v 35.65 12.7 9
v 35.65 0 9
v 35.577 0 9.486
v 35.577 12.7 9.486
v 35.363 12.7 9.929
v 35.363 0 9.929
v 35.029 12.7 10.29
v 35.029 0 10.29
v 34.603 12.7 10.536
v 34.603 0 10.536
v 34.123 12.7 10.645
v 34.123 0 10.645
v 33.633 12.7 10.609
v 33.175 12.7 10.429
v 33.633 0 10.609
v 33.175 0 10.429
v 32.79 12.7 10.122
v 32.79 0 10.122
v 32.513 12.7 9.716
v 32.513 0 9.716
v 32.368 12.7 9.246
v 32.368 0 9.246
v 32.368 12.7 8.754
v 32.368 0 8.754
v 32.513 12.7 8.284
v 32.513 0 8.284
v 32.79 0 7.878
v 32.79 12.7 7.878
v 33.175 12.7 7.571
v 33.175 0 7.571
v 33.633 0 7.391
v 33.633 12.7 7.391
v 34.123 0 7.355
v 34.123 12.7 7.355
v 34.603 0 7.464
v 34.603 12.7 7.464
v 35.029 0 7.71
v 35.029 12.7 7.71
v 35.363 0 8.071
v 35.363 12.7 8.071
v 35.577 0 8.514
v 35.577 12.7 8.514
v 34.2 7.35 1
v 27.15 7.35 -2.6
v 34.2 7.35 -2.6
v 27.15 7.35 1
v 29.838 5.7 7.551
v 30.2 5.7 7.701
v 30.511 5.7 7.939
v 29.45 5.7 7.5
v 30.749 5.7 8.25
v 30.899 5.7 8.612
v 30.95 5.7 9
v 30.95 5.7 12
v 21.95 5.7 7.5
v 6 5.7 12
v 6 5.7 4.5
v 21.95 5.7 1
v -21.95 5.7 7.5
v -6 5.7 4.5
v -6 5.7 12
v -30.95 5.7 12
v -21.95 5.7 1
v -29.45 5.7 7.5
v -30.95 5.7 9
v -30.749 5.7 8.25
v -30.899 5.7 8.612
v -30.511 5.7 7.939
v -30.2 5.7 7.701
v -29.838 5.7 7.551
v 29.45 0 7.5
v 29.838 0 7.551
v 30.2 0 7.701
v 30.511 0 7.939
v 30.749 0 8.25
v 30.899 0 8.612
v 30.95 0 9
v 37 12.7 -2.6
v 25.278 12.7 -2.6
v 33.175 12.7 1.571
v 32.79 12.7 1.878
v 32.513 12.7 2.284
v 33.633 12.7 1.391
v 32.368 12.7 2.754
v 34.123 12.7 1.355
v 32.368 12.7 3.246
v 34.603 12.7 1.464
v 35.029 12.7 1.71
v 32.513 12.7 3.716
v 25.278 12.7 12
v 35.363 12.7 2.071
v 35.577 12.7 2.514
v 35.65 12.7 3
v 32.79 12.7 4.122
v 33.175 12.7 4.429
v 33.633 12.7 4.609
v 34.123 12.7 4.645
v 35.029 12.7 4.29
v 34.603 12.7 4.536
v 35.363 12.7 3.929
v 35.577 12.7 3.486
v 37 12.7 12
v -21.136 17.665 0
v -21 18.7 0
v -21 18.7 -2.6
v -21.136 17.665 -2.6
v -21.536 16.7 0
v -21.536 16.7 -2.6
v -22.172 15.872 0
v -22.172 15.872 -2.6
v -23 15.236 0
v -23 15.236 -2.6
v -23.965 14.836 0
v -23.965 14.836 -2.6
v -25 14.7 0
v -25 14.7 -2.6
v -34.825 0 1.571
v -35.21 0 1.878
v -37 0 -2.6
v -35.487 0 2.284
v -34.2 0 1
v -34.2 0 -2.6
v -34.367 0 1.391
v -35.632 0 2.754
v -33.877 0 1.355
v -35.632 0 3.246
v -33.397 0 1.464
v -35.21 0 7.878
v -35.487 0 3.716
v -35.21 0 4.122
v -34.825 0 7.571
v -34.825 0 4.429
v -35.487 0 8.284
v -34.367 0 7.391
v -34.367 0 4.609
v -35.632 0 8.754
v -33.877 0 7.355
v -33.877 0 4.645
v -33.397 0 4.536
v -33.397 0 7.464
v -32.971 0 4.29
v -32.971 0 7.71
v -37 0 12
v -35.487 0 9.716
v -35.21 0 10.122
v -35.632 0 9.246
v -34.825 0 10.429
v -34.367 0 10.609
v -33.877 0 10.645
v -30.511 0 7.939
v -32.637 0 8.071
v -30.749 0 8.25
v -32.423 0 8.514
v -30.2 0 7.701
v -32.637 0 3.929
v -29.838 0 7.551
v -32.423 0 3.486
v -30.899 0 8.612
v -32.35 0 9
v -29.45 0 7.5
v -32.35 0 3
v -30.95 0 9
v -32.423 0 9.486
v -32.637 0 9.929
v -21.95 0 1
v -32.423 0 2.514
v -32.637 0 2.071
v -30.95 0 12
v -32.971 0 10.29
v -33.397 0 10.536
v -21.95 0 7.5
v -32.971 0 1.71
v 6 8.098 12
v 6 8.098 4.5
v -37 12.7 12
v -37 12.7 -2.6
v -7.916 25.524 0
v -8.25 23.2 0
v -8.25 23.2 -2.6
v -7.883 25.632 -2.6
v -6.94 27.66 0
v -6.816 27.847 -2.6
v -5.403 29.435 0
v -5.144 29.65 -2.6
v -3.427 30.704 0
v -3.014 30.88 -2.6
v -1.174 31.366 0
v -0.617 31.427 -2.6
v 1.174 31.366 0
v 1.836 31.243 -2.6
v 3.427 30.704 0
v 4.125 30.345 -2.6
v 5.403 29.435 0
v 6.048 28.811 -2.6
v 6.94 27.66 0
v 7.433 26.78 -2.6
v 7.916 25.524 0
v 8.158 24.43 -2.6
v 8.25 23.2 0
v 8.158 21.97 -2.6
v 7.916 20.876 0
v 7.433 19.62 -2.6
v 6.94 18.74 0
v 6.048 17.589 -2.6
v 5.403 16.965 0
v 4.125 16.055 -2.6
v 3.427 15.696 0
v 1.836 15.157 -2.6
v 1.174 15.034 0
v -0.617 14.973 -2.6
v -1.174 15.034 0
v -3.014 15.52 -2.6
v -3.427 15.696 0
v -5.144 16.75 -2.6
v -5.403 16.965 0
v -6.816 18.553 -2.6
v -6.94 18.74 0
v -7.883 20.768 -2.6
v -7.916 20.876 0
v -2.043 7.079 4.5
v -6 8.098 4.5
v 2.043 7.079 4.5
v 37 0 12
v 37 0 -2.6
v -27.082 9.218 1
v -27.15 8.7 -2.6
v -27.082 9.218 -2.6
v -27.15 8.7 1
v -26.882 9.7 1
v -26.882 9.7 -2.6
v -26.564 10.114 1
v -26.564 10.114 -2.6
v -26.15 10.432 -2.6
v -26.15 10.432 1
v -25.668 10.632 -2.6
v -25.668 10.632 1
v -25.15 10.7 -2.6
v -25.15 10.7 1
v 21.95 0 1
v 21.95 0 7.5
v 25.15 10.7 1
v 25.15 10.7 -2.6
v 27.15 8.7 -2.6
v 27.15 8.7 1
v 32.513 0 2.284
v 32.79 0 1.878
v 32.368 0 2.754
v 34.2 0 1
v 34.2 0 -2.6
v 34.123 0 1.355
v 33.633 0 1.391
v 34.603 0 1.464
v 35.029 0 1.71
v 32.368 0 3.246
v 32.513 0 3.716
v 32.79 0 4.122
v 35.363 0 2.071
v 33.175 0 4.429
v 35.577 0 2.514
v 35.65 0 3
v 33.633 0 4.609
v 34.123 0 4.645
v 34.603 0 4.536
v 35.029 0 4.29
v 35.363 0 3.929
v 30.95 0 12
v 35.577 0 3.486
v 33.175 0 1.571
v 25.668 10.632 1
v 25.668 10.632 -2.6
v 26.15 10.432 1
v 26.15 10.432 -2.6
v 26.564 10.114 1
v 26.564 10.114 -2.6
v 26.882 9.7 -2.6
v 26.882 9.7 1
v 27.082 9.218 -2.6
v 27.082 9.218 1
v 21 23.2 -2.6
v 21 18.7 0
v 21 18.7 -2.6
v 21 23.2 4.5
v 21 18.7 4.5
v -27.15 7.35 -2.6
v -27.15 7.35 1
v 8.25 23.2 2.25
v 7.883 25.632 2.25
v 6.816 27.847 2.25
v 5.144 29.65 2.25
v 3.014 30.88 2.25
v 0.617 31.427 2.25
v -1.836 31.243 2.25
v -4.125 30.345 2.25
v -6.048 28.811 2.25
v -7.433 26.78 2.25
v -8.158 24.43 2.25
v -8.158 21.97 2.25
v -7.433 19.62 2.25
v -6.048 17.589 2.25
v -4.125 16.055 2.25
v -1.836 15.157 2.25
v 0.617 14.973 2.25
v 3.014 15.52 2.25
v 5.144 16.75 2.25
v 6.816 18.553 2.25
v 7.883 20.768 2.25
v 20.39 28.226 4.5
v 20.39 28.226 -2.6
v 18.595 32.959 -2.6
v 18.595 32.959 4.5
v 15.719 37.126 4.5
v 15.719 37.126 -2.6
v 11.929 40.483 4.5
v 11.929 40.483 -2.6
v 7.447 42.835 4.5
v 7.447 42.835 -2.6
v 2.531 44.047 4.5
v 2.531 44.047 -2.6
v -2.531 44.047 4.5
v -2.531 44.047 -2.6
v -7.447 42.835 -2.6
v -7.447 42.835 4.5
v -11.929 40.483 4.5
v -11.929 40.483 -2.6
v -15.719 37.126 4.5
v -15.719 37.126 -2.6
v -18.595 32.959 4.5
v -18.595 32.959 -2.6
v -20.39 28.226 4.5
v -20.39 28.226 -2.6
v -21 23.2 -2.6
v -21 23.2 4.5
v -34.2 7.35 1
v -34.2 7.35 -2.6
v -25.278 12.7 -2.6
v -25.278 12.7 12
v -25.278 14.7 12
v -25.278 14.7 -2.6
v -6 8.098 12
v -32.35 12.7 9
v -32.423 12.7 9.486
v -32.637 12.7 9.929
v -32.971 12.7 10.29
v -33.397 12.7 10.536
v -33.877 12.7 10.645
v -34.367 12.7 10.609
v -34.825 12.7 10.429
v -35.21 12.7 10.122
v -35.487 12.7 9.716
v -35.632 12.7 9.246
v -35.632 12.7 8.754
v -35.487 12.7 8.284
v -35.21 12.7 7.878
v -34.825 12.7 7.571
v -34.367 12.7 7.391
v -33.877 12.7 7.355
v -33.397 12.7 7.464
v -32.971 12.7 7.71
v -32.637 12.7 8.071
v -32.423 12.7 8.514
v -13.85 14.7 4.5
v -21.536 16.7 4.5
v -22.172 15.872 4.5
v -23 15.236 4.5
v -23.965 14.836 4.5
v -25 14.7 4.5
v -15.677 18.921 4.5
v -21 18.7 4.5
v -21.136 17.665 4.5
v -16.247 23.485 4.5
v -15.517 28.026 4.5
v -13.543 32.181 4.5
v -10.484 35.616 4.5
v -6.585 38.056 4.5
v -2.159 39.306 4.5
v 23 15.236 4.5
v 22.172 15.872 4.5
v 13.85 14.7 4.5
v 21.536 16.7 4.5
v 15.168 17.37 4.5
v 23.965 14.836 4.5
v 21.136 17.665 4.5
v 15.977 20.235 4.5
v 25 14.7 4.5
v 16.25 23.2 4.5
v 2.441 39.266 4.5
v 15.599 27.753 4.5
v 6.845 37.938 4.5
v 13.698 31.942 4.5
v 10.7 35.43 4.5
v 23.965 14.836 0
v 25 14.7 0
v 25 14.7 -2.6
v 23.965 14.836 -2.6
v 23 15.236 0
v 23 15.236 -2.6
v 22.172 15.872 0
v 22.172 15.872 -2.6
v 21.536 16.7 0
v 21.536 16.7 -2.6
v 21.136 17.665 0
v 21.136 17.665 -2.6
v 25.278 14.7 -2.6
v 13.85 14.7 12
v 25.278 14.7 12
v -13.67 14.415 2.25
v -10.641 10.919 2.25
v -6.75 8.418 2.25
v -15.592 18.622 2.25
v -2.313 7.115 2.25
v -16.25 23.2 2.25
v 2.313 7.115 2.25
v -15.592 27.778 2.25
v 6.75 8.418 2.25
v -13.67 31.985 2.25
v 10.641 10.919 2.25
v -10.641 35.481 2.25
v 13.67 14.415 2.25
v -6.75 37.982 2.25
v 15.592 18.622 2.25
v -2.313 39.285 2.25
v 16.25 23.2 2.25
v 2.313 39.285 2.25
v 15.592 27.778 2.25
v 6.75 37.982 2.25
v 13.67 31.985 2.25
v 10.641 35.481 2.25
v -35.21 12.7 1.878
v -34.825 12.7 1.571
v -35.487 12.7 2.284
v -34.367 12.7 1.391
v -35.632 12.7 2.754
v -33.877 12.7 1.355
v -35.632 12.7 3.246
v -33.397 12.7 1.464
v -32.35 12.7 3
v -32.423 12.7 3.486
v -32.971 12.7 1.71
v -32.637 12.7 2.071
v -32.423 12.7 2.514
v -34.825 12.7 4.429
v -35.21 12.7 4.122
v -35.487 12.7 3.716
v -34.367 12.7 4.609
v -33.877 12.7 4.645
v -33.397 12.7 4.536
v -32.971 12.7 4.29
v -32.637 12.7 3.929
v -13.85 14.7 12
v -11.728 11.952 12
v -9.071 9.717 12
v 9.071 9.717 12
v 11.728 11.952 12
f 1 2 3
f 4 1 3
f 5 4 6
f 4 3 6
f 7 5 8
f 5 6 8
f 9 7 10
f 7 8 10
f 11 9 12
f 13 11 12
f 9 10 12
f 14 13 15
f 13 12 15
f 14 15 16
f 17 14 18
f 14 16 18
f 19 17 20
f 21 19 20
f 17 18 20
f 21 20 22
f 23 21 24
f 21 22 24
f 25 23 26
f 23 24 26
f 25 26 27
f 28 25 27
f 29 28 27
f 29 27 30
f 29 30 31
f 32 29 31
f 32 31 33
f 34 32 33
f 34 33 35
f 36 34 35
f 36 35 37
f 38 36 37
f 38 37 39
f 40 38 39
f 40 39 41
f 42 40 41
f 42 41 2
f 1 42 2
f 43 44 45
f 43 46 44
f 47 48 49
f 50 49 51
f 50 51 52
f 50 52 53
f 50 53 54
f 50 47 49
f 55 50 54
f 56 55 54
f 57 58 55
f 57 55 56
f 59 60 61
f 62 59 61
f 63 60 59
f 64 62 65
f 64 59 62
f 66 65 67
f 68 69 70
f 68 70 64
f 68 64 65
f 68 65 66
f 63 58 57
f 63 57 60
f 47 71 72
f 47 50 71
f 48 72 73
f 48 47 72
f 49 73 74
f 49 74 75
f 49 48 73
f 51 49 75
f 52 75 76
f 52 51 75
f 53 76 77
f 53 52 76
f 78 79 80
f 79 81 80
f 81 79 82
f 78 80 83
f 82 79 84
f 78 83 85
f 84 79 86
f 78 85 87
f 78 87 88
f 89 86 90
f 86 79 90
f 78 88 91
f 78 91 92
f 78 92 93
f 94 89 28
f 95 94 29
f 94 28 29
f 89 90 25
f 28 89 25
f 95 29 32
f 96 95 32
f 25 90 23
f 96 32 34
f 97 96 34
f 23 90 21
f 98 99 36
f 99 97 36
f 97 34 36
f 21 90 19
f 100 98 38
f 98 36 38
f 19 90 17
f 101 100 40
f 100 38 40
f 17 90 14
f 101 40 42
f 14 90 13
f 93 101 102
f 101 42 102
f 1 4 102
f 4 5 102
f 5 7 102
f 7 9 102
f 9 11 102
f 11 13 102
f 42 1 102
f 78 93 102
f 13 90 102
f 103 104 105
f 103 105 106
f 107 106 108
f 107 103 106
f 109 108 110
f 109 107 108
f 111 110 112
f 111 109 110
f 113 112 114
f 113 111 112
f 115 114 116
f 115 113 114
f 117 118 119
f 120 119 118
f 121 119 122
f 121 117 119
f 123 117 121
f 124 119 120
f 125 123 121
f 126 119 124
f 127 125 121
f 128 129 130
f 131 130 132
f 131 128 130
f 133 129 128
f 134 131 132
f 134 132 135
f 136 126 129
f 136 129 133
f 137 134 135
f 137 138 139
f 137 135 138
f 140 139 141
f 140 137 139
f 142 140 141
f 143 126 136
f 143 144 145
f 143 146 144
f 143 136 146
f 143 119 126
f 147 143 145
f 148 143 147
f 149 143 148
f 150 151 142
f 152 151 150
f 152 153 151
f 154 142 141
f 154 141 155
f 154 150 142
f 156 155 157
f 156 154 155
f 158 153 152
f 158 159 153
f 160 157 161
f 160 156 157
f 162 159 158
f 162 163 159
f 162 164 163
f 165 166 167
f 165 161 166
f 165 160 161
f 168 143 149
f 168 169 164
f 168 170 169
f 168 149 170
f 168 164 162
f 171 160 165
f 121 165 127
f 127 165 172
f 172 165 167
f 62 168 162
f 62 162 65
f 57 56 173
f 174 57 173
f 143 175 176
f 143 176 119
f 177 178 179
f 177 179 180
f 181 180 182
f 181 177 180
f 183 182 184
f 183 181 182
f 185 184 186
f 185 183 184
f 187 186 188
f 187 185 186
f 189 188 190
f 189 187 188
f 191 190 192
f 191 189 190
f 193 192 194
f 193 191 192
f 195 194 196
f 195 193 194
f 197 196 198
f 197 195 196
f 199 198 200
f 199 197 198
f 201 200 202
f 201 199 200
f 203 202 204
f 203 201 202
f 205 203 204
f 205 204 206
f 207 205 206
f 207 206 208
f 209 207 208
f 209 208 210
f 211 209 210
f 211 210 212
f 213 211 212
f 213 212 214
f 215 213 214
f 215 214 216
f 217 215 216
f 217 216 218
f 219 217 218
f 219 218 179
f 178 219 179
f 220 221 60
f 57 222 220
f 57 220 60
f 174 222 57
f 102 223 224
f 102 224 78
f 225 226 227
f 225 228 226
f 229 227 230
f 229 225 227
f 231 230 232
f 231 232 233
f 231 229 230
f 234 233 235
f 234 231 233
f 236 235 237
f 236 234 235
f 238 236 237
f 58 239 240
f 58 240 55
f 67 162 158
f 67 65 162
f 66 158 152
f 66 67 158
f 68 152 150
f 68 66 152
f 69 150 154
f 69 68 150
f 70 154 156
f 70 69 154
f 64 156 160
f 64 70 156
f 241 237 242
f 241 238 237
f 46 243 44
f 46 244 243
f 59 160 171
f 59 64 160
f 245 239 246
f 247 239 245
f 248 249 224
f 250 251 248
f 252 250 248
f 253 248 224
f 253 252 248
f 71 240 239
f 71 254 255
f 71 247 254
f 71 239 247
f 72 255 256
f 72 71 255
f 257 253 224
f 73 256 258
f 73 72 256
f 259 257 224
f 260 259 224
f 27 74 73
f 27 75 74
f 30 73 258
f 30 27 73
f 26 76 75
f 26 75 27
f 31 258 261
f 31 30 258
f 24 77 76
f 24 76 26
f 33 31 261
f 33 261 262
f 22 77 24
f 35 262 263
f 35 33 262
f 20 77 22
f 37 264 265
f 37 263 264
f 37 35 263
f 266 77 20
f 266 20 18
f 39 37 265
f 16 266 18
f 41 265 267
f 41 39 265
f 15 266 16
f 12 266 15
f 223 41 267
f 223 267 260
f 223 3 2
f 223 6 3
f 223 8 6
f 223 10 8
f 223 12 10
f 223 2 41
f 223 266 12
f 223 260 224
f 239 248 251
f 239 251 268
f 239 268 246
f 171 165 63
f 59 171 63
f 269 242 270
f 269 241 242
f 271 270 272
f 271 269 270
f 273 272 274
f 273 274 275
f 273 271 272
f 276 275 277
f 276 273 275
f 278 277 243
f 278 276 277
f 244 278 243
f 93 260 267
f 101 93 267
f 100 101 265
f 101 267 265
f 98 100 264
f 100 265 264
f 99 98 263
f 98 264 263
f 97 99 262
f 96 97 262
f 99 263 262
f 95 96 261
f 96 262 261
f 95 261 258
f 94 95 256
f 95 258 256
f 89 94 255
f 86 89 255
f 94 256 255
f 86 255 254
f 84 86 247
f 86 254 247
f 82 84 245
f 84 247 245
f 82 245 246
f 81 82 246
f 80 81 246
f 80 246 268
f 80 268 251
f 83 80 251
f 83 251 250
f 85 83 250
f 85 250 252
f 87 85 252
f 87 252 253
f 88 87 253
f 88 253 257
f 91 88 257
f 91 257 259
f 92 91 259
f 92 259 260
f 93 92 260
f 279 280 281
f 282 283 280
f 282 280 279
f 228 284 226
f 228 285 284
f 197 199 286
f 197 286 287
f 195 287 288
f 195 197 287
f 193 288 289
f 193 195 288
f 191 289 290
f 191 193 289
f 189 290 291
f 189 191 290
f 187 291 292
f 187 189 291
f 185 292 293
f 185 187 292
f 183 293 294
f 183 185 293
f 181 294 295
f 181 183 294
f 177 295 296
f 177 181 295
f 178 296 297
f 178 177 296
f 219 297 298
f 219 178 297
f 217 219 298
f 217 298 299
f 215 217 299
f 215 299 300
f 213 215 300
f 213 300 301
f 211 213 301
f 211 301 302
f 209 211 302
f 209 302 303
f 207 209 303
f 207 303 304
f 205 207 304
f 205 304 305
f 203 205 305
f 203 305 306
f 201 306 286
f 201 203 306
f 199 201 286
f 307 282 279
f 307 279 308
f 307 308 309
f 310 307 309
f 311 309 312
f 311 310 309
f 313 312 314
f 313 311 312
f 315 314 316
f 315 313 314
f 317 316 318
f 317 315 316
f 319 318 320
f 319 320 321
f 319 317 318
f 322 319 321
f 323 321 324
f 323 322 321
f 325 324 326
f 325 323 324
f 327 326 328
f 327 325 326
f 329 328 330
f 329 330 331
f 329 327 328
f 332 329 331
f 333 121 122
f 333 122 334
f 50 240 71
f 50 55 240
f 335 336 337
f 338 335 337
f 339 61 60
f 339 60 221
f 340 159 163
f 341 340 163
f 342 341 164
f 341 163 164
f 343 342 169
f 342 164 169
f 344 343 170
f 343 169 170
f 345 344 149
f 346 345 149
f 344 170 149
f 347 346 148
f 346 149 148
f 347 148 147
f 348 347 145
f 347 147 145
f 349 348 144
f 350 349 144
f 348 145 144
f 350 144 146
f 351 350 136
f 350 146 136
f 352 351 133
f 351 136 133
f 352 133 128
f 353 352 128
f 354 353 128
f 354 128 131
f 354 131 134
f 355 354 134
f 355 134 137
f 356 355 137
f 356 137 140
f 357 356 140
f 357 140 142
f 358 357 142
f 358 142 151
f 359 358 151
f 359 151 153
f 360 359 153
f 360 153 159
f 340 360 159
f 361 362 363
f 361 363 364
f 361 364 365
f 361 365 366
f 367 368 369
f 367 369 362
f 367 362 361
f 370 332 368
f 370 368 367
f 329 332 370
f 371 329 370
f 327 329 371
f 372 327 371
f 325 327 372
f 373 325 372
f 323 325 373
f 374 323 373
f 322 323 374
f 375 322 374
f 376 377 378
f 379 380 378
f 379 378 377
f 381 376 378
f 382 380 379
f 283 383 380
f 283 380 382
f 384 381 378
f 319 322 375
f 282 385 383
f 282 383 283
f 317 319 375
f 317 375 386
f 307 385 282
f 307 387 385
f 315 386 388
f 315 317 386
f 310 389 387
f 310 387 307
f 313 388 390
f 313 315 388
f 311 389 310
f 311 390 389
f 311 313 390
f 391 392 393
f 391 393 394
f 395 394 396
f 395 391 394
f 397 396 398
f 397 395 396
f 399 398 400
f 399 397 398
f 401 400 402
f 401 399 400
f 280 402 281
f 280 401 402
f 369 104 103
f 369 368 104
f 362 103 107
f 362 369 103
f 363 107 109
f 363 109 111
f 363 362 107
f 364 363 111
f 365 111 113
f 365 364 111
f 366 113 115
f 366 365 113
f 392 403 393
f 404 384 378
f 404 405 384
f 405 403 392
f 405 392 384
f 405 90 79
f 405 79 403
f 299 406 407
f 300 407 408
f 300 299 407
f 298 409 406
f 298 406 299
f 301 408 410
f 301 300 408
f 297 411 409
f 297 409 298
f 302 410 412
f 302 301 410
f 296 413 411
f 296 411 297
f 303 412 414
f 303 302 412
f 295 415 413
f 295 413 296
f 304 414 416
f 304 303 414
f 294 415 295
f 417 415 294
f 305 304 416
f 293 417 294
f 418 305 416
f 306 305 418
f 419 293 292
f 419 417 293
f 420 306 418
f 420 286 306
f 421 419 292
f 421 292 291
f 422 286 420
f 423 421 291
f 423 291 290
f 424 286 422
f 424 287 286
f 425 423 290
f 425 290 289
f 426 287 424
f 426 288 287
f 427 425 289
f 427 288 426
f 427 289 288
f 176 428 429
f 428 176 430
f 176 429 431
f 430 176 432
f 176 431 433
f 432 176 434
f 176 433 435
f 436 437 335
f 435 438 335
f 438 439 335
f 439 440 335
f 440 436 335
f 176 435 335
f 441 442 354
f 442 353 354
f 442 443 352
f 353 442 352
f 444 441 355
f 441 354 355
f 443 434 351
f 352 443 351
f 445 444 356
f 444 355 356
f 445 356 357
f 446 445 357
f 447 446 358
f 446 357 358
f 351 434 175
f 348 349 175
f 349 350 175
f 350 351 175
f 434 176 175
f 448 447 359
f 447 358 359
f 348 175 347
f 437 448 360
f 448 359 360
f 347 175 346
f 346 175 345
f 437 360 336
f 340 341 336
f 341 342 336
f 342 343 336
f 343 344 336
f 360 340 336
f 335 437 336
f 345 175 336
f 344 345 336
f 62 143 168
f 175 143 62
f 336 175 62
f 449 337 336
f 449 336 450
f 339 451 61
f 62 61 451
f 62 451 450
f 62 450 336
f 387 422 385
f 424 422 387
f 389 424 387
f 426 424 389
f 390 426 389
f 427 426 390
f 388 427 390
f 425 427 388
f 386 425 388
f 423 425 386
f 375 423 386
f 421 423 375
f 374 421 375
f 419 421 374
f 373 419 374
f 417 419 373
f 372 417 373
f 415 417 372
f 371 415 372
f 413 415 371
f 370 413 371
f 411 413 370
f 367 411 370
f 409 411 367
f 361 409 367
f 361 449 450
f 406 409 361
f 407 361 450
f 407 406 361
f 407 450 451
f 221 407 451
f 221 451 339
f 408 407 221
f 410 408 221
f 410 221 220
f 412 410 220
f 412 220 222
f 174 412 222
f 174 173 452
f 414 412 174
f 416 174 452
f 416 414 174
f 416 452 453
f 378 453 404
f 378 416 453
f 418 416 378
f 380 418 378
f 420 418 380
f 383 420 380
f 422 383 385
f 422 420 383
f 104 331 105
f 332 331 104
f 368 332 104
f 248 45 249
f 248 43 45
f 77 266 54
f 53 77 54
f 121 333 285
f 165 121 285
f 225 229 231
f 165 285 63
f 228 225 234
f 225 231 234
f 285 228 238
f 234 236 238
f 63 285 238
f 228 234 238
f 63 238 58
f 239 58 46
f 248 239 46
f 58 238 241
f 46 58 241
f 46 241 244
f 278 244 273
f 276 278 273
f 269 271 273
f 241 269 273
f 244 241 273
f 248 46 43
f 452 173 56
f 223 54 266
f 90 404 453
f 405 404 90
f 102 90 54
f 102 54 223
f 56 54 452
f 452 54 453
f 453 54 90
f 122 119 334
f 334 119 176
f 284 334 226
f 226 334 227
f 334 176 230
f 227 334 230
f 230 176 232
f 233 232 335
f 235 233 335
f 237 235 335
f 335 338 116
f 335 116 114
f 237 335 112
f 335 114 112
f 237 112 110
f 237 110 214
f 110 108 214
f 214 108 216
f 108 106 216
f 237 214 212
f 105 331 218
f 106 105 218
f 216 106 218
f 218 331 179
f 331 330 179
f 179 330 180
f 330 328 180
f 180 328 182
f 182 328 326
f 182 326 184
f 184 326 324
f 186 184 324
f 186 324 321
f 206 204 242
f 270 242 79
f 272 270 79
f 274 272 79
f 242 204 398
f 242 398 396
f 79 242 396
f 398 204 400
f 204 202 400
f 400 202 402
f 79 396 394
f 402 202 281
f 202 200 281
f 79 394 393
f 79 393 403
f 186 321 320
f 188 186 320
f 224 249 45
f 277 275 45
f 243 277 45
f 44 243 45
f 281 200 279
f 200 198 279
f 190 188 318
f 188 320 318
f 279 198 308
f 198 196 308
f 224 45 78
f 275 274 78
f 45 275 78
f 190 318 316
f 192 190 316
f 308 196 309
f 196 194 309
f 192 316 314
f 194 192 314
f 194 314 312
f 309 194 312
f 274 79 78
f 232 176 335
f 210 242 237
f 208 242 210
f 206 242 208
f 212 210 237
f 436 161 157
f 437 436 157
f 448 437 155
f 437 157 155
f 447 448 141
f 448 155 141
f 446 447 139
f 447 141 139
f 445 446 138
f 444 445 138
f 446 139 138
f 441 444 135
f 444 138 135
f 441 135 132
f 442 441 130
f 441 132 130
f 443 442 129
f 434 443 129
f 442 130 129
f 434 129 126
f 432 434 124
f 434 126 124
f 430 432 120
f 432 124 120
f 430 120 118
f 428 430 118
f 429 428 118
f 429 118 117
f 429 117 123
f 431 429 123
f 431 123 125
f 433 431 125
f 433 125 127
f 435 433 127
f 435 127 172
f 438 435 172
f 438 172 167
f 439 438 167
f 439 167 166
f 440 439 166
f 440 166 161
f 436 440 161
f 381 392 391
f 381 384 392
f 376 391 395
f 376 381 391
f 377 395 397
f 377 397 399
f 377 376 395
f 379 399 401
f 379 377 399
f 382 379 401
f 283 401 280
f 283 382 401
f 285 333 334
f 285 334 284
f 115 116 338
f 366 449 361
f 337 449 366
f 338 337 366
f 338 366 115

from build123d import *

# Parameters (mm, degrees)
SKETCH2_R           = 16
BOSS_EXTRUDE1_DEPTH = 12
SKETCH3_R           = 16
SKETCH3_R_2         = 8.25
BOSS_EXTRUDE2_DEPTH = 2.5
CUT_EXTRUDE4_DEPTH  = 1
CUT_EXTRUDE5_REACH  = 60.683
SKETCH9_W           = 43.9
SKETCH9_H           = 5.7
SKETCH10_R          = 1.65
CUT_EXTRUDE6_DEPTH  = 59.87817932
CUT_EXTRUDE7_START  = -7.5
CUT_EXTRUDE7_DEPTH  = 7.5
FILETE1_R           = 2
FILETE2_R           = 4
SKETCH12_W          = 9
SKETCH12_H          = 5.7
CUT_EXTRUDE8_DEPTH  = 4.5
SKETCH15_W          = 12
SKETCH15_H          = 2.667603026
CUT_EXTRUDE10_DEPTH = 7.5
SKETCH16_R          = 8.25
BOSS_EXTRUDE3_DEPTH = 2.6
FILLET2_R           = 1.5
CUT_EXTRUDE11_REACH = 61.463
SKETCH17_W          = 11.722279144
SKETCH17_H          = 2
CUT_EXTRUDE12_START = -2.25
SKETCH18_R          = 16.25
CUT_EXTRUDE12_DEPTH = 9.75


with BuildPart() as part:
    # Sketch2 → Boss-Extrude1 (new body)
    with BuildSketch(Plane.XY):
        with BuildLine():
            Line((-21, 0), (21, 0))
            Line((21, 0), (37, 0))
            Line((37, 0), (37, 14.7))
            Line((37, 14.7), (21, 14.7))
            Line((21, 14.7), (21, 23.2))
            ThreePointArc((21, 23.2), (0, 44.2), (-21, 23.2))
            Line((-21, 23.2), (-21, 14.7))
            Line((-21, 14.7), (-37, 14.7))
            Line((-37, 14.7), (-37, 0))
            Line((-37, 0), (-21, 0))
        make_face()
        with Locations((0, 23.2)):
            Circle(SKETCH2_R, mode=Mode.SUBTRACT)
    extrude(amount=BOSS_EXTRUDE1_DEPTH)

    # Sketch3 → Boss-Extrude2 (add)
    with BuildSketch(Plane.XY):
        with Locations((0, 23.2)):
            Circle(SKETCH3_R)
        with Locations((0, 23.2)):
            Circle(SKETCH3_R_2, mode=Mode.SUBTRACT)
    extrude(amount=BOSS_EXTRUDE2_DEPTH)

    # Sketch8 → Cut-Extrude4 (cut)
    with BuildSketch(Plane.XY):
        Polygon((-27.15, 0), (27.15, 0), (34.2, 0), (34.2, 7.35), (27.15, 7.35), (27.15, 10.7), (-27.15, 10.7), (-27.15, 7.35), (-34.2, 7.35), (-34.2, 0), align=None)
    extrude(amount=CUT_EXTRUDE4_DEPTH, mode=Mode.SUBTRACT)

    # Sketch9 → Cut-Extrude5 (cut, up to next)
    with BuildSketch(Plane(origin=(0, 0, 1), x_dir=(-1, 0, 0), z_dir=(0, 0, -1)), mode=Mode.PRIVATE) as cut_extrude5_sk1:
        with Locations((0, 2.85)):
            Rectangle(SKETCH9_W, SKETCH9_H)
    cut_extrude5_tool1 = extrude(cut_extrude5_sk1.sketch, amount=-CUT_EXTRUDE5_REACH, mode=Mode.PRIVATE) & part.part
    add(cut_extrude5_tool1.solids().sort_by_distance((0, 2.85, 1))[0], mode=Mode.SUBTRACT)

    # Sketch10 → Cut-Extrude6 (cut, through all)
    with BuildSketch(Plane.XZ):
        with Locations((-34, 9)):
            Circle(SKETCH10_R)
        with Locations((-34, 3)):
            Circle(SKETCH10_R)
        with Locations((34, 3)):
            Circle(SKETCH10_R)
        with Locations((34, 9)):
            Circle(SKETCH10_R)
    extrude(amount=-CUT_EXTRUDE6_DEPTH, mode=Mode.SUBTRACT)

    # Sketch11 → Cut-Extrude7 (cut)
    with BuildSketch(Plane.XY.offset(12).offset(CUT_EXTRUDE7_START)):
        with BuildLine():
            Line((21, 14.7), (21, 23.2))
            ThreePointArc((21, 23.2), (0, 44.2), (-21, 23.2))
            Line((-21, 23.2), (-21, 14.7))
            Line((-21, 14.7), (21, 14.7))
        make_face()
    extrude(amount=CUT_EXTRUDE7_DEPTH, mode=Mode.SUBTRACT)

    # Filete1
    filete1_edges = [part.edges().sort_by_distance(p)[0] for p in [
        (27.15, 10.7, 0.5),
        (-27.15, 10.7, 0.5),
    ]]
    fillet(filete1_edges, radius=FILETE1_R)

    # Filete2
    filete2_edges = [part.edges().sort_by_distance(p)[0] for p in [
        (-21, 14.7, 2.25),
        (21, 14.7, 2.25),
    ]]
    fillet(filete2_edges, radius=FILETE2_R)

    # Sketch12 → Cut-Extrude8 (cut)
    with BuildSketch(Plane.XY.offset(12)):
        with Locations((26.45, 2.85)):
            Rectangle(SKETCH12_W, SKETCH12_H)
        with Locations((-26.45, 2.85)):
            Rectangle(SKETCH12_W, SKETCH12_H)
    extrude(amount=-CUT_EXTRUDE8_DEPTH, mode=Mode.SUBTRACT)

    # Sketch15 → Cut-Extrude10 (cut)
    with BuildSketch(Plane.XY.offset(12)):
        with Locations((0, 7.033801513)):
            Rectangle(SKETCH15_W, SKETCH15_H)
    extrude(amount=-CUT_EXTRUDE10_DEPTH, mode=Mode.SUBTRACT)

    # Sketch16 → Boss-Extrude3 (add)
    with BuildSketch(Plane(origin=(0, 0, 0), x_dir=(-1, 0, 0), z_dir=(0, 0, -1))):
        with BuildLine():
            Line((-37, 14.7), (-25, 14.7))
            ThreePointArc((-25, 14.7), (-22.171572875, 15.871572875), (-21, 18.7))
            Line((-21, 18.7), (-21, 23.2))
            ThreePointArc((-21, 23.2), (0, 44.2), (21, 23.2))
            Line((21, 23.2), (21, 18.7))
            ThreePointArc((21, 18.7), (22.171572875, 15.871572875), (25, 14.7))
            Line((25, 14.7), (37, 14.7))
            Line((37, 14.7), (37, 0))
            Line((37, 0), (34.2, 0))
            Line((34.2, 0), (34.2, 7.35))
            Line((34.2, 7.35), (27.15, 7.35))
            Line((27.15, 7.35), (27.15, 8.7))
            ThreePointArc((27.15, 8.7), (26.564213562, 10.114213562), (25.15, 10.7))
            Line((25.15, 10.7), (-25.15, 10.7))
            ThreePointArc((-25.15, 10.7), (-26.564213562, 10.114213562), (-27.15, 8.7))
            Line((-27.15, 8.7), (-27.15, 7.35))
            Line((-27.15, 7.35), (-34.2, 7.35))
            Line((-34.2, 7.35), (-34.2, 0))
            Line((-34.2, 0), (-37, 0))
            Line((-37, 0), (-37, 14.7))
        make_face()
        with Locations((0, 23.2)):
            Circle(SKETCH16_R, mode=Mode.SUBTRACT)
    extrude(amount=BOSS_EXTRUDE3_DEPTH)

    # Fillet2
    fillet2_edges = [part.edges().sort_by_distance(p)[0] for p in [
        (30.95, 2.85, 7.5),
        (-30.95, 2.85, 7.5),
    ]]
    fillet(fillet2_edges, radius=FILLET2_R)

    # Sketch17 → Cut-Extrude11 (cut, up to next)
    with BuildSketch(Plane.XY.offset(12), mode=Mode.PRIVATE) as cut_extrude11_sk1:
        with Locations((-31.138860428, 13.7)):
            Rectangle(SKETCH17_W, SKETCH17_H)
    cut_extrude11_tool1 = extrude(cut_extrude11_sk1.sketch, amount=-CUT_EXTRUDE11_REACH, mode=Mode.PRIVATE) & part.part
    # Sketch17 → Cut-Extrude11 (cut, up to next)
    with BuildSketch(Plane.XY.offset(12), mode=Mode.PRIVATE) as cut_extrude11_sk2:
        with Locations((31.138860428, 13.7)):
            Rectangle(SKETCH17_W, SKETCH17_H)
    cut_extrude11_tool2 = extrude(cut_extrude11_sk2.sketch, amount=-CUT_EXTRUDE11_REACH, mode=Mode.PRIVATE) & part.part
    add(cut_extrude11_tool1.solids().sort_by_distance((-31.13886, 13.7, 12))[0], mode=Mode.SUBTRACT)
    add(cut_extrude11_tool2.solids().sort_by_distance((31.13886, 13.7, 12))[0], mode=Mode.SUBTRACT)

    # Sketch18 → Cut-Extrude12 (cut)
    with BuildSketch(Plane.XY.offset(4.5).offset(CUT_EXTRUDE12_START)):
        with Locations((0, 23.2)):
            Circle(SKETCH18_R)
    extrude(amount=CUT_EXTRUDE12_DEPTH, mode=Mode.SUBTRACT)


solid = part.part
